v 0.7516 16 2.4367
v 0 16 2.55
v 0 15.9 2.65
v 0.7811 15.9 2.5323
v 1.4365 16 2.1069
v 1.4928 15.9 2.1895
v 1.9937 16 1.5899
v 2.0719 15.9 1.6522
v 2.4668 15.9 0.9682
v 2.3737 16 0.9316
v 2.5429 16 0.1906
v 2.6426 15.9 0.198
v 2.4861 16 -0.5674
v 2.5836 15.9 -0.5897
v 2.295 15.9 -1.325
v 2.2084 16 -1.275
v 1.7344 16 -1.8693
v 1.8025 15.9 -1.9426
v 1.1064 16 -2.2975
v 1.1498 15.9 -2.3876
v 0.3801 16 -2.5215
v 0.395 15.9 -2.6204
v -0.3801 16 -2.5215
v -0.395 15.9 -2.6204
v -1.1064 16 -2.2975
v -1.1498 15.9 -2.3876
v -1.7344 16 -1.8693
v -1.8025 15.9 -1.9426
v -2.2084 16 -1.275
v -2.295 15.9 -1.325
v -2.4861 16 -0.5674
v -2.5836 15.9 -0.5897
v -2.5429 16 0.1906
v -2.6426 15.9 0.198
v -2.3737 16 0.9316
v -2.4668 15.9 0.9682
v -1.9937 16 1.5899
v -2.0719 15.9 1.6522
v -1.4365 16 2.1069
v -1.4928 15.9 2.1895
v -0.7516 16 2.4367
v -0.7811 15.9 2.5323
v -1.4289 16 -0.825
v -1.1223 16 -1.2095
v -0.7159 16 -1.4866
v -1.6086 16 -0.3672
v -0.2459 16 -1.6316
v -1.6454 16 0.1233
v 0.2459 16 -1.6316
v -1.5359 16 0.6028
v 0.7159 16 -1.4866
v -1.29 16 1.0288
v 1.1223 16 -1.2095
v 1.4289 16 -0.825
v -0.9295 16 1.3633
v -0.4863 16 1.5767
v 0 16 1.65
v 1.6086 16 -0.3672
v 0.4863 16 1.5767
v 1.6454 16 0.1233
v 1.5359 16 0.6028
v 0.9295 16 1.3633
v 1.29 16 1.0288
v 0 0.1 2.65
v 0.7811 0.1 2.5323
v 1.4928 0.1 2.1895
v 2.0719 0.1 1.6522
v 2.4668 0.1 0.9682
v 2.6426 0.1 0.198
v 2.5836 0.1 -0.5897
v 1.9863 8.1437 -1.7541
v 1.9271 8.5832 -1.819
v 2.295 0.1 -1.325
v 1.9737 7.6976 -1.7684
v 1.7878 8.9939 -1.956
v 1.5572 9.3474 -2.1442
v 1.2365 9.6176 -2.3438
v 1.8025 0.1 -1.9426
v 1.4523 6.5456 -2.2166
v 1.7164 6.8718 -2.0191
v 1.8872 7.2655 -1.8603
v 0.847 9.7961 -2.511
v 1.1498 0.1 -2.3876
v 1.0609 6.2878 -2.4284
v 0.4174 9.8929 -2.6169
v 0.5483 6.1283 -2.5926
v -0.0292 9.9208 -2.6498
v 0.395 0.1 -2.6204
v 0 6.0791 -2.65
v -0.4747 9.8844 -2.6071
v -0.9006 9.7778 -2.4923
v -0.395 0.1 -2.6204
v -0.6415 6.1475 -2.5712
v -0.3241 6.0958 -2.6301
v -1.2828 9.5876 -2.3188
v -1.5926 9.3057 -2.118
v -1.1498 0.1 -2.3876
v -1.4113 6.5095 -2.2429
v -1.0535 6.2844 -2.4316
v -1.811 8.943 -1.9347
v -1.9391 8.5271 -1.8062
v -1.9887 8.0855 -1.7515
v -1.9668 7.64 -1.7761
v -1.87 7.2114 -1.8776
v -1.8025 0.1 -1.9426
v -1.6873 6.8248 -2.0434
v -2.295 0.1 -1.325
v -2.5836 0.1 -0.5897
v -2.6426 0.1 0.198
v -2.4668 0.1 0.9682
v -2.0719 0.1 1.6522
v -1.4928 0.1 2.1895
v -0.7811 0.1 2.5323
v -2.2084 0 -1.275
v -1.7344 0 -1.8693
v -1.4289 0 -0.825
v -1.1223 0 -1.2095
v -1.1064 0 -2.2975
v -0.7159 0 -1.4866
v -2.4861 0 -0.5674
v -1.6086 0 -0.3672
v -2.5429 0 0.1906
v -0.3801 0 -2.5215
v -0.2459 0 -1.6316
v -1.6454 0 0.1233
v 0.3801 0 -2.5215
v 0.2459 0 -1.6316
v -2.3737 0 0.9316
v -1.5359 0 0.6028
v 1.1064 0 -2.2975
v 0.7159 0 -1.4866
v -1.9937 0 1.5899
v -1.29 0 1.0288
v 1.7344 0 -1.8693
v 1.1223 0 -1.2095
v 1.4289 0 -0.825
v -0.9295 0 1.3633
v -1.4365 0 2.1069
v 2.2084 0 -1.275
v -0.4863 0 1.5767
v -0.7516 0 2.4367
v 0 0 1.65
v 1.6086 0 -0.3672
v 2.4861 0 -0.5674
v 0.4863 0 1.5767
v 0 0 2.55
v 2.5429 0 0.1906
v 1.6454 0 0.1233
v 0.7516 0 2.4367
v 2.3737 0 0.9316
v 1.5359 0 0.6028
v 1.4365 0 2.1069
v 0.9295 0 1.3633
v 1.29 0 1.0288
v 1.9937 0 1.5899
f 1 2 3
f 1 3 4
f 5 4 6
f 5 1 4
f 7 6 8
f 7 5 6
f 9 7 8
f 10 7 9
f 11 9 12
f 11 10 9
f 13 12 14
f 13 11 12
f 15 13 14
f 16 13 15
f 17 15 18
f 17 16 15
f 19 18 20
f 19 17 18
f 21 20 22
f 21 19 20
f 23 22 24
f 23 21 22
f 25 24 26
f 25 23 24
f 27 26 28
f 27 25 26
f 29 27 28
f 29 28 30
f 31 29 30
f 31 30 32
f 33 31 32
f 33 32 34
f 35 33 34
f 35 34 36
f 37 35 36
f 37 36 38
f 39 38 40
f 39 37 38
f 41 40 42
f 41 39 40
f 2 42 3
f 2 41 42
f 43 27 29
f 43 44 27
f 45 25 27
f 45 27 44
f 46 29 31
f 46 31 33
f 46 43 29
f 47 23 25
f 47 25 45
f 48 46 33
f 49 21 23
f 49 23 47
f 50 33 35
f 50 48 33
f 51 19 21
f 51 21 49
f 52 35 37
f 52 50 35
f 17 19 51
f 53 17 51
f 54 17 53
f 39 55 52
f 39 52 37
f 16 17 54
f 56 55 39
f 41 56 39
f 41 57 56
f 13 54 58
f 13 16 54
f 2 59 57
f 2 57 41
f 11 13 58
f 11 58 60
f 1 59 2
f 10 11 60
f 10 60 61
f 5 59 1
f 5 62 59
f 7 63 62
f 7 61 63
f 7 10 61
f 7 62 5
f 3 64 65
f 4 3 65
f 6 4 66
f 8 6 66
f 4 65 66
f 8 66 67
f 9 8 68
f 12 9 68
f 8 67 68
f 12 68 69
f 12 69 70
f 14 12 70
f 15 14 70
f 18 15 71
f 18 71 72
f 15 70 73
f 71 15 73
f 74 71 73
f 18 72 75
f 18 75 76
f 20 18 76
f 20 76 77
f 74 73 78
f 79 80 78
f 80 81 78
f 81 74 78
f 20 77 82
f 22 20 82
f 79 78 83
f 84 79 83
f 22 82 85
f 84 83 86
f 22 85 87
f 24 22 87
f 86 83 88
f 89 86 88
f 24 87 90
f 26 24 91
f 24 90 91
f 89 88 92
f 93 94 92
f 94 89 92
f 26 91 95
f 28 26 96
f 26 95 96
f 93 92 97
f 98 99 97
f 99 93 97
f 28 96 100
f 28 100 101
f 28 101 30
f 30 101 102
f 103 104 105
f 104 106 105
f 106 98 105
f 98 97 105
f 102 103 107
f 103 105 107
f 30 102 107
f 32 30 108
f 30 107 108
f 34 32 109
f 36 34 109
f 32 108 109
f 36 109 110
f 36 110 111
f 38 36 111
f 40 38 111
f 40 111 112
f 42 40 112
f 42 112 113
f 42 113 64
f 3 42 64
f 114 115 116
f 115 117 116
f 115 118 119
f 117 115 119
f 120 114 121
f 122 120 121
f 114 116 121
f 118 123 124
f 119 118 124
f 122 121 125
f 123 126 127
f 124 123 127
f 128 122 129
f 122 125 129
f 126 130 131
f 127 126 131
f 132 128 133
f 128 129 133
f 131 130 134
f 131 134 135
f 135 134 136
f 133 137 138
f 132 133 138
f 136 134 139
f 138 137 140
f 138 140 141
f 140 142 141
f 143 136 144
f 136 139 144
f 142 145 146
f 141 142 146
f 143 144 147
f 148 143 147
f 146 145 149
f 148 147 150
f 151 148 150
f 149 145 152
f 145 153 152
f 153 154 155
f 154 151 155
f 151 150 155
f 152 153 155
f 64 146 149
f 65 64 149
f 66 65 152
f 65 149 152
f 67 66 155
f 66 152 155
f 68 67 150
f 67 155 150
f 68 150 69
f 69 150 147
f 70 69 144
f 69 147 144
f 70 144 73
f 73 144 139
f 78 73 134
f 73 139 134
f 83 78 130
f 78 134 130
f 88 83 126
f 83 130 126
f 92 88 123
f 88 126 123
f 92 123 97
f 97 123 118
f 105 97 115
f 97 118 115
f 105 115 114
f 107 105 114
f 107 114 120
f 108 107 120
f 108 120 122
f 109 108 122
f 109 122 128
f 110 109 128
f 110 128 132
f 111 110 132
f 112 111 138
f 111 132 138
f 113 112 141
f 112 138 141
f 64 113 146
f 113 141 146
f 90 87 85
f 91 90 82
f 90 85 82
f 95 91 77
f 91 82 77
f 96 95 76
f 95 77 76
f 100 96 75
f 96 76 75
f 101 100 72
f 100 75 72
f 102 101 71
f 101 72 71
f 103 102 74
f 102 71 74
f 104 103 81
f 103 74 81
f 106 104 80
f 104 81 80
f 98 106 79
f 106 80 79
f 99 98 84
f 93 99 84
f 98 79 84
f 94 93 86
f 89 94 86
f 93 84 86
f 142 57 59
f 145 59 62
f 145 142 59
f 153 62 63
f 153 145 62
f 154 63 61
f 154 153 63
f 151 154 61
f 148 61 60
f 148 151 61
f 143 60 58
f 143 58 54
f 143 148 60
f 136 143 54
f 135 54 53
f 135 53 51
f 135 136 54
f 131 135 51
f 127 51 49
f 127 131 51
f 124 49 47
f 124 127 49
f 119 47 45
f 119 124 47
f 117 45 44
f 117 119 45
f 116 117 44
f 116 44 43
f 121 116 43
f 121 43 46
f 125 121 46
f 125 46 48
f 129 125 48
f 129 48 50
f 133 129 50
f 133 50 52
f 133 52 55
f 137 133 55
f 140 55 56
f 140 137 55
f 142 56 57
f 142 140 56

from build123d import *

# Parameters (mm, degrees)
IZIM1_R                     = 2.65
IZIM1_R_2                   = 1.65
Y_KSEKLIK_EKSTR_ZYON1_DEPTH = 16
PAH1_SIZE                   = 0.1
IZIM2_R                     = 2.5
KES_EKSTR_ZYON1_DEPTH       = 8.8


with BuildPart() as part:
    # Çizim1 → Yükseklik-Ekstrüzyon1 (new body)
    with BuildSketch(Plane(origin=(0, 0, 0), x_dir=(1, 0, 0), z_dir=(0, 1, 0))):
        with Locations(Location((0, 0, 0), (0, 0, 270))):
            Circle(IZIM1_R)
        with Locations(Location((0, 0, 0), (0, 0, 270))):
            Circle(IZIM1_R_2, mode=Mode.SUBTRACT)
    extrude(amount=Y_KSEKLIK_EKSTR_ZYON1_DEPTH)

    # Pah1
    pah1_edges = [part.edges().sort_by_distance(p)[0] for p in [
        (0, 0, -2.65),
        (0, 16, -2.65),
    ]]
    chamfer(pah1_edges, length=PAH1_SIZE)

    # Çizim2 → Kes-Ekstrüzyon1 (cut, symmetric)
    with BuildSketch(Plane(origin=(0, 0, 0), x_dir=(0, 0, -1), z_dir=(1, 0, 0))):
        with Locations((4.25, 8)):
            Circle(IZIM2_R)
    extrude(amount=KES_EKSTR_ZYON1_DEPTH, both=True, mode=Mode.SUBTRACT)


solid = part.part
